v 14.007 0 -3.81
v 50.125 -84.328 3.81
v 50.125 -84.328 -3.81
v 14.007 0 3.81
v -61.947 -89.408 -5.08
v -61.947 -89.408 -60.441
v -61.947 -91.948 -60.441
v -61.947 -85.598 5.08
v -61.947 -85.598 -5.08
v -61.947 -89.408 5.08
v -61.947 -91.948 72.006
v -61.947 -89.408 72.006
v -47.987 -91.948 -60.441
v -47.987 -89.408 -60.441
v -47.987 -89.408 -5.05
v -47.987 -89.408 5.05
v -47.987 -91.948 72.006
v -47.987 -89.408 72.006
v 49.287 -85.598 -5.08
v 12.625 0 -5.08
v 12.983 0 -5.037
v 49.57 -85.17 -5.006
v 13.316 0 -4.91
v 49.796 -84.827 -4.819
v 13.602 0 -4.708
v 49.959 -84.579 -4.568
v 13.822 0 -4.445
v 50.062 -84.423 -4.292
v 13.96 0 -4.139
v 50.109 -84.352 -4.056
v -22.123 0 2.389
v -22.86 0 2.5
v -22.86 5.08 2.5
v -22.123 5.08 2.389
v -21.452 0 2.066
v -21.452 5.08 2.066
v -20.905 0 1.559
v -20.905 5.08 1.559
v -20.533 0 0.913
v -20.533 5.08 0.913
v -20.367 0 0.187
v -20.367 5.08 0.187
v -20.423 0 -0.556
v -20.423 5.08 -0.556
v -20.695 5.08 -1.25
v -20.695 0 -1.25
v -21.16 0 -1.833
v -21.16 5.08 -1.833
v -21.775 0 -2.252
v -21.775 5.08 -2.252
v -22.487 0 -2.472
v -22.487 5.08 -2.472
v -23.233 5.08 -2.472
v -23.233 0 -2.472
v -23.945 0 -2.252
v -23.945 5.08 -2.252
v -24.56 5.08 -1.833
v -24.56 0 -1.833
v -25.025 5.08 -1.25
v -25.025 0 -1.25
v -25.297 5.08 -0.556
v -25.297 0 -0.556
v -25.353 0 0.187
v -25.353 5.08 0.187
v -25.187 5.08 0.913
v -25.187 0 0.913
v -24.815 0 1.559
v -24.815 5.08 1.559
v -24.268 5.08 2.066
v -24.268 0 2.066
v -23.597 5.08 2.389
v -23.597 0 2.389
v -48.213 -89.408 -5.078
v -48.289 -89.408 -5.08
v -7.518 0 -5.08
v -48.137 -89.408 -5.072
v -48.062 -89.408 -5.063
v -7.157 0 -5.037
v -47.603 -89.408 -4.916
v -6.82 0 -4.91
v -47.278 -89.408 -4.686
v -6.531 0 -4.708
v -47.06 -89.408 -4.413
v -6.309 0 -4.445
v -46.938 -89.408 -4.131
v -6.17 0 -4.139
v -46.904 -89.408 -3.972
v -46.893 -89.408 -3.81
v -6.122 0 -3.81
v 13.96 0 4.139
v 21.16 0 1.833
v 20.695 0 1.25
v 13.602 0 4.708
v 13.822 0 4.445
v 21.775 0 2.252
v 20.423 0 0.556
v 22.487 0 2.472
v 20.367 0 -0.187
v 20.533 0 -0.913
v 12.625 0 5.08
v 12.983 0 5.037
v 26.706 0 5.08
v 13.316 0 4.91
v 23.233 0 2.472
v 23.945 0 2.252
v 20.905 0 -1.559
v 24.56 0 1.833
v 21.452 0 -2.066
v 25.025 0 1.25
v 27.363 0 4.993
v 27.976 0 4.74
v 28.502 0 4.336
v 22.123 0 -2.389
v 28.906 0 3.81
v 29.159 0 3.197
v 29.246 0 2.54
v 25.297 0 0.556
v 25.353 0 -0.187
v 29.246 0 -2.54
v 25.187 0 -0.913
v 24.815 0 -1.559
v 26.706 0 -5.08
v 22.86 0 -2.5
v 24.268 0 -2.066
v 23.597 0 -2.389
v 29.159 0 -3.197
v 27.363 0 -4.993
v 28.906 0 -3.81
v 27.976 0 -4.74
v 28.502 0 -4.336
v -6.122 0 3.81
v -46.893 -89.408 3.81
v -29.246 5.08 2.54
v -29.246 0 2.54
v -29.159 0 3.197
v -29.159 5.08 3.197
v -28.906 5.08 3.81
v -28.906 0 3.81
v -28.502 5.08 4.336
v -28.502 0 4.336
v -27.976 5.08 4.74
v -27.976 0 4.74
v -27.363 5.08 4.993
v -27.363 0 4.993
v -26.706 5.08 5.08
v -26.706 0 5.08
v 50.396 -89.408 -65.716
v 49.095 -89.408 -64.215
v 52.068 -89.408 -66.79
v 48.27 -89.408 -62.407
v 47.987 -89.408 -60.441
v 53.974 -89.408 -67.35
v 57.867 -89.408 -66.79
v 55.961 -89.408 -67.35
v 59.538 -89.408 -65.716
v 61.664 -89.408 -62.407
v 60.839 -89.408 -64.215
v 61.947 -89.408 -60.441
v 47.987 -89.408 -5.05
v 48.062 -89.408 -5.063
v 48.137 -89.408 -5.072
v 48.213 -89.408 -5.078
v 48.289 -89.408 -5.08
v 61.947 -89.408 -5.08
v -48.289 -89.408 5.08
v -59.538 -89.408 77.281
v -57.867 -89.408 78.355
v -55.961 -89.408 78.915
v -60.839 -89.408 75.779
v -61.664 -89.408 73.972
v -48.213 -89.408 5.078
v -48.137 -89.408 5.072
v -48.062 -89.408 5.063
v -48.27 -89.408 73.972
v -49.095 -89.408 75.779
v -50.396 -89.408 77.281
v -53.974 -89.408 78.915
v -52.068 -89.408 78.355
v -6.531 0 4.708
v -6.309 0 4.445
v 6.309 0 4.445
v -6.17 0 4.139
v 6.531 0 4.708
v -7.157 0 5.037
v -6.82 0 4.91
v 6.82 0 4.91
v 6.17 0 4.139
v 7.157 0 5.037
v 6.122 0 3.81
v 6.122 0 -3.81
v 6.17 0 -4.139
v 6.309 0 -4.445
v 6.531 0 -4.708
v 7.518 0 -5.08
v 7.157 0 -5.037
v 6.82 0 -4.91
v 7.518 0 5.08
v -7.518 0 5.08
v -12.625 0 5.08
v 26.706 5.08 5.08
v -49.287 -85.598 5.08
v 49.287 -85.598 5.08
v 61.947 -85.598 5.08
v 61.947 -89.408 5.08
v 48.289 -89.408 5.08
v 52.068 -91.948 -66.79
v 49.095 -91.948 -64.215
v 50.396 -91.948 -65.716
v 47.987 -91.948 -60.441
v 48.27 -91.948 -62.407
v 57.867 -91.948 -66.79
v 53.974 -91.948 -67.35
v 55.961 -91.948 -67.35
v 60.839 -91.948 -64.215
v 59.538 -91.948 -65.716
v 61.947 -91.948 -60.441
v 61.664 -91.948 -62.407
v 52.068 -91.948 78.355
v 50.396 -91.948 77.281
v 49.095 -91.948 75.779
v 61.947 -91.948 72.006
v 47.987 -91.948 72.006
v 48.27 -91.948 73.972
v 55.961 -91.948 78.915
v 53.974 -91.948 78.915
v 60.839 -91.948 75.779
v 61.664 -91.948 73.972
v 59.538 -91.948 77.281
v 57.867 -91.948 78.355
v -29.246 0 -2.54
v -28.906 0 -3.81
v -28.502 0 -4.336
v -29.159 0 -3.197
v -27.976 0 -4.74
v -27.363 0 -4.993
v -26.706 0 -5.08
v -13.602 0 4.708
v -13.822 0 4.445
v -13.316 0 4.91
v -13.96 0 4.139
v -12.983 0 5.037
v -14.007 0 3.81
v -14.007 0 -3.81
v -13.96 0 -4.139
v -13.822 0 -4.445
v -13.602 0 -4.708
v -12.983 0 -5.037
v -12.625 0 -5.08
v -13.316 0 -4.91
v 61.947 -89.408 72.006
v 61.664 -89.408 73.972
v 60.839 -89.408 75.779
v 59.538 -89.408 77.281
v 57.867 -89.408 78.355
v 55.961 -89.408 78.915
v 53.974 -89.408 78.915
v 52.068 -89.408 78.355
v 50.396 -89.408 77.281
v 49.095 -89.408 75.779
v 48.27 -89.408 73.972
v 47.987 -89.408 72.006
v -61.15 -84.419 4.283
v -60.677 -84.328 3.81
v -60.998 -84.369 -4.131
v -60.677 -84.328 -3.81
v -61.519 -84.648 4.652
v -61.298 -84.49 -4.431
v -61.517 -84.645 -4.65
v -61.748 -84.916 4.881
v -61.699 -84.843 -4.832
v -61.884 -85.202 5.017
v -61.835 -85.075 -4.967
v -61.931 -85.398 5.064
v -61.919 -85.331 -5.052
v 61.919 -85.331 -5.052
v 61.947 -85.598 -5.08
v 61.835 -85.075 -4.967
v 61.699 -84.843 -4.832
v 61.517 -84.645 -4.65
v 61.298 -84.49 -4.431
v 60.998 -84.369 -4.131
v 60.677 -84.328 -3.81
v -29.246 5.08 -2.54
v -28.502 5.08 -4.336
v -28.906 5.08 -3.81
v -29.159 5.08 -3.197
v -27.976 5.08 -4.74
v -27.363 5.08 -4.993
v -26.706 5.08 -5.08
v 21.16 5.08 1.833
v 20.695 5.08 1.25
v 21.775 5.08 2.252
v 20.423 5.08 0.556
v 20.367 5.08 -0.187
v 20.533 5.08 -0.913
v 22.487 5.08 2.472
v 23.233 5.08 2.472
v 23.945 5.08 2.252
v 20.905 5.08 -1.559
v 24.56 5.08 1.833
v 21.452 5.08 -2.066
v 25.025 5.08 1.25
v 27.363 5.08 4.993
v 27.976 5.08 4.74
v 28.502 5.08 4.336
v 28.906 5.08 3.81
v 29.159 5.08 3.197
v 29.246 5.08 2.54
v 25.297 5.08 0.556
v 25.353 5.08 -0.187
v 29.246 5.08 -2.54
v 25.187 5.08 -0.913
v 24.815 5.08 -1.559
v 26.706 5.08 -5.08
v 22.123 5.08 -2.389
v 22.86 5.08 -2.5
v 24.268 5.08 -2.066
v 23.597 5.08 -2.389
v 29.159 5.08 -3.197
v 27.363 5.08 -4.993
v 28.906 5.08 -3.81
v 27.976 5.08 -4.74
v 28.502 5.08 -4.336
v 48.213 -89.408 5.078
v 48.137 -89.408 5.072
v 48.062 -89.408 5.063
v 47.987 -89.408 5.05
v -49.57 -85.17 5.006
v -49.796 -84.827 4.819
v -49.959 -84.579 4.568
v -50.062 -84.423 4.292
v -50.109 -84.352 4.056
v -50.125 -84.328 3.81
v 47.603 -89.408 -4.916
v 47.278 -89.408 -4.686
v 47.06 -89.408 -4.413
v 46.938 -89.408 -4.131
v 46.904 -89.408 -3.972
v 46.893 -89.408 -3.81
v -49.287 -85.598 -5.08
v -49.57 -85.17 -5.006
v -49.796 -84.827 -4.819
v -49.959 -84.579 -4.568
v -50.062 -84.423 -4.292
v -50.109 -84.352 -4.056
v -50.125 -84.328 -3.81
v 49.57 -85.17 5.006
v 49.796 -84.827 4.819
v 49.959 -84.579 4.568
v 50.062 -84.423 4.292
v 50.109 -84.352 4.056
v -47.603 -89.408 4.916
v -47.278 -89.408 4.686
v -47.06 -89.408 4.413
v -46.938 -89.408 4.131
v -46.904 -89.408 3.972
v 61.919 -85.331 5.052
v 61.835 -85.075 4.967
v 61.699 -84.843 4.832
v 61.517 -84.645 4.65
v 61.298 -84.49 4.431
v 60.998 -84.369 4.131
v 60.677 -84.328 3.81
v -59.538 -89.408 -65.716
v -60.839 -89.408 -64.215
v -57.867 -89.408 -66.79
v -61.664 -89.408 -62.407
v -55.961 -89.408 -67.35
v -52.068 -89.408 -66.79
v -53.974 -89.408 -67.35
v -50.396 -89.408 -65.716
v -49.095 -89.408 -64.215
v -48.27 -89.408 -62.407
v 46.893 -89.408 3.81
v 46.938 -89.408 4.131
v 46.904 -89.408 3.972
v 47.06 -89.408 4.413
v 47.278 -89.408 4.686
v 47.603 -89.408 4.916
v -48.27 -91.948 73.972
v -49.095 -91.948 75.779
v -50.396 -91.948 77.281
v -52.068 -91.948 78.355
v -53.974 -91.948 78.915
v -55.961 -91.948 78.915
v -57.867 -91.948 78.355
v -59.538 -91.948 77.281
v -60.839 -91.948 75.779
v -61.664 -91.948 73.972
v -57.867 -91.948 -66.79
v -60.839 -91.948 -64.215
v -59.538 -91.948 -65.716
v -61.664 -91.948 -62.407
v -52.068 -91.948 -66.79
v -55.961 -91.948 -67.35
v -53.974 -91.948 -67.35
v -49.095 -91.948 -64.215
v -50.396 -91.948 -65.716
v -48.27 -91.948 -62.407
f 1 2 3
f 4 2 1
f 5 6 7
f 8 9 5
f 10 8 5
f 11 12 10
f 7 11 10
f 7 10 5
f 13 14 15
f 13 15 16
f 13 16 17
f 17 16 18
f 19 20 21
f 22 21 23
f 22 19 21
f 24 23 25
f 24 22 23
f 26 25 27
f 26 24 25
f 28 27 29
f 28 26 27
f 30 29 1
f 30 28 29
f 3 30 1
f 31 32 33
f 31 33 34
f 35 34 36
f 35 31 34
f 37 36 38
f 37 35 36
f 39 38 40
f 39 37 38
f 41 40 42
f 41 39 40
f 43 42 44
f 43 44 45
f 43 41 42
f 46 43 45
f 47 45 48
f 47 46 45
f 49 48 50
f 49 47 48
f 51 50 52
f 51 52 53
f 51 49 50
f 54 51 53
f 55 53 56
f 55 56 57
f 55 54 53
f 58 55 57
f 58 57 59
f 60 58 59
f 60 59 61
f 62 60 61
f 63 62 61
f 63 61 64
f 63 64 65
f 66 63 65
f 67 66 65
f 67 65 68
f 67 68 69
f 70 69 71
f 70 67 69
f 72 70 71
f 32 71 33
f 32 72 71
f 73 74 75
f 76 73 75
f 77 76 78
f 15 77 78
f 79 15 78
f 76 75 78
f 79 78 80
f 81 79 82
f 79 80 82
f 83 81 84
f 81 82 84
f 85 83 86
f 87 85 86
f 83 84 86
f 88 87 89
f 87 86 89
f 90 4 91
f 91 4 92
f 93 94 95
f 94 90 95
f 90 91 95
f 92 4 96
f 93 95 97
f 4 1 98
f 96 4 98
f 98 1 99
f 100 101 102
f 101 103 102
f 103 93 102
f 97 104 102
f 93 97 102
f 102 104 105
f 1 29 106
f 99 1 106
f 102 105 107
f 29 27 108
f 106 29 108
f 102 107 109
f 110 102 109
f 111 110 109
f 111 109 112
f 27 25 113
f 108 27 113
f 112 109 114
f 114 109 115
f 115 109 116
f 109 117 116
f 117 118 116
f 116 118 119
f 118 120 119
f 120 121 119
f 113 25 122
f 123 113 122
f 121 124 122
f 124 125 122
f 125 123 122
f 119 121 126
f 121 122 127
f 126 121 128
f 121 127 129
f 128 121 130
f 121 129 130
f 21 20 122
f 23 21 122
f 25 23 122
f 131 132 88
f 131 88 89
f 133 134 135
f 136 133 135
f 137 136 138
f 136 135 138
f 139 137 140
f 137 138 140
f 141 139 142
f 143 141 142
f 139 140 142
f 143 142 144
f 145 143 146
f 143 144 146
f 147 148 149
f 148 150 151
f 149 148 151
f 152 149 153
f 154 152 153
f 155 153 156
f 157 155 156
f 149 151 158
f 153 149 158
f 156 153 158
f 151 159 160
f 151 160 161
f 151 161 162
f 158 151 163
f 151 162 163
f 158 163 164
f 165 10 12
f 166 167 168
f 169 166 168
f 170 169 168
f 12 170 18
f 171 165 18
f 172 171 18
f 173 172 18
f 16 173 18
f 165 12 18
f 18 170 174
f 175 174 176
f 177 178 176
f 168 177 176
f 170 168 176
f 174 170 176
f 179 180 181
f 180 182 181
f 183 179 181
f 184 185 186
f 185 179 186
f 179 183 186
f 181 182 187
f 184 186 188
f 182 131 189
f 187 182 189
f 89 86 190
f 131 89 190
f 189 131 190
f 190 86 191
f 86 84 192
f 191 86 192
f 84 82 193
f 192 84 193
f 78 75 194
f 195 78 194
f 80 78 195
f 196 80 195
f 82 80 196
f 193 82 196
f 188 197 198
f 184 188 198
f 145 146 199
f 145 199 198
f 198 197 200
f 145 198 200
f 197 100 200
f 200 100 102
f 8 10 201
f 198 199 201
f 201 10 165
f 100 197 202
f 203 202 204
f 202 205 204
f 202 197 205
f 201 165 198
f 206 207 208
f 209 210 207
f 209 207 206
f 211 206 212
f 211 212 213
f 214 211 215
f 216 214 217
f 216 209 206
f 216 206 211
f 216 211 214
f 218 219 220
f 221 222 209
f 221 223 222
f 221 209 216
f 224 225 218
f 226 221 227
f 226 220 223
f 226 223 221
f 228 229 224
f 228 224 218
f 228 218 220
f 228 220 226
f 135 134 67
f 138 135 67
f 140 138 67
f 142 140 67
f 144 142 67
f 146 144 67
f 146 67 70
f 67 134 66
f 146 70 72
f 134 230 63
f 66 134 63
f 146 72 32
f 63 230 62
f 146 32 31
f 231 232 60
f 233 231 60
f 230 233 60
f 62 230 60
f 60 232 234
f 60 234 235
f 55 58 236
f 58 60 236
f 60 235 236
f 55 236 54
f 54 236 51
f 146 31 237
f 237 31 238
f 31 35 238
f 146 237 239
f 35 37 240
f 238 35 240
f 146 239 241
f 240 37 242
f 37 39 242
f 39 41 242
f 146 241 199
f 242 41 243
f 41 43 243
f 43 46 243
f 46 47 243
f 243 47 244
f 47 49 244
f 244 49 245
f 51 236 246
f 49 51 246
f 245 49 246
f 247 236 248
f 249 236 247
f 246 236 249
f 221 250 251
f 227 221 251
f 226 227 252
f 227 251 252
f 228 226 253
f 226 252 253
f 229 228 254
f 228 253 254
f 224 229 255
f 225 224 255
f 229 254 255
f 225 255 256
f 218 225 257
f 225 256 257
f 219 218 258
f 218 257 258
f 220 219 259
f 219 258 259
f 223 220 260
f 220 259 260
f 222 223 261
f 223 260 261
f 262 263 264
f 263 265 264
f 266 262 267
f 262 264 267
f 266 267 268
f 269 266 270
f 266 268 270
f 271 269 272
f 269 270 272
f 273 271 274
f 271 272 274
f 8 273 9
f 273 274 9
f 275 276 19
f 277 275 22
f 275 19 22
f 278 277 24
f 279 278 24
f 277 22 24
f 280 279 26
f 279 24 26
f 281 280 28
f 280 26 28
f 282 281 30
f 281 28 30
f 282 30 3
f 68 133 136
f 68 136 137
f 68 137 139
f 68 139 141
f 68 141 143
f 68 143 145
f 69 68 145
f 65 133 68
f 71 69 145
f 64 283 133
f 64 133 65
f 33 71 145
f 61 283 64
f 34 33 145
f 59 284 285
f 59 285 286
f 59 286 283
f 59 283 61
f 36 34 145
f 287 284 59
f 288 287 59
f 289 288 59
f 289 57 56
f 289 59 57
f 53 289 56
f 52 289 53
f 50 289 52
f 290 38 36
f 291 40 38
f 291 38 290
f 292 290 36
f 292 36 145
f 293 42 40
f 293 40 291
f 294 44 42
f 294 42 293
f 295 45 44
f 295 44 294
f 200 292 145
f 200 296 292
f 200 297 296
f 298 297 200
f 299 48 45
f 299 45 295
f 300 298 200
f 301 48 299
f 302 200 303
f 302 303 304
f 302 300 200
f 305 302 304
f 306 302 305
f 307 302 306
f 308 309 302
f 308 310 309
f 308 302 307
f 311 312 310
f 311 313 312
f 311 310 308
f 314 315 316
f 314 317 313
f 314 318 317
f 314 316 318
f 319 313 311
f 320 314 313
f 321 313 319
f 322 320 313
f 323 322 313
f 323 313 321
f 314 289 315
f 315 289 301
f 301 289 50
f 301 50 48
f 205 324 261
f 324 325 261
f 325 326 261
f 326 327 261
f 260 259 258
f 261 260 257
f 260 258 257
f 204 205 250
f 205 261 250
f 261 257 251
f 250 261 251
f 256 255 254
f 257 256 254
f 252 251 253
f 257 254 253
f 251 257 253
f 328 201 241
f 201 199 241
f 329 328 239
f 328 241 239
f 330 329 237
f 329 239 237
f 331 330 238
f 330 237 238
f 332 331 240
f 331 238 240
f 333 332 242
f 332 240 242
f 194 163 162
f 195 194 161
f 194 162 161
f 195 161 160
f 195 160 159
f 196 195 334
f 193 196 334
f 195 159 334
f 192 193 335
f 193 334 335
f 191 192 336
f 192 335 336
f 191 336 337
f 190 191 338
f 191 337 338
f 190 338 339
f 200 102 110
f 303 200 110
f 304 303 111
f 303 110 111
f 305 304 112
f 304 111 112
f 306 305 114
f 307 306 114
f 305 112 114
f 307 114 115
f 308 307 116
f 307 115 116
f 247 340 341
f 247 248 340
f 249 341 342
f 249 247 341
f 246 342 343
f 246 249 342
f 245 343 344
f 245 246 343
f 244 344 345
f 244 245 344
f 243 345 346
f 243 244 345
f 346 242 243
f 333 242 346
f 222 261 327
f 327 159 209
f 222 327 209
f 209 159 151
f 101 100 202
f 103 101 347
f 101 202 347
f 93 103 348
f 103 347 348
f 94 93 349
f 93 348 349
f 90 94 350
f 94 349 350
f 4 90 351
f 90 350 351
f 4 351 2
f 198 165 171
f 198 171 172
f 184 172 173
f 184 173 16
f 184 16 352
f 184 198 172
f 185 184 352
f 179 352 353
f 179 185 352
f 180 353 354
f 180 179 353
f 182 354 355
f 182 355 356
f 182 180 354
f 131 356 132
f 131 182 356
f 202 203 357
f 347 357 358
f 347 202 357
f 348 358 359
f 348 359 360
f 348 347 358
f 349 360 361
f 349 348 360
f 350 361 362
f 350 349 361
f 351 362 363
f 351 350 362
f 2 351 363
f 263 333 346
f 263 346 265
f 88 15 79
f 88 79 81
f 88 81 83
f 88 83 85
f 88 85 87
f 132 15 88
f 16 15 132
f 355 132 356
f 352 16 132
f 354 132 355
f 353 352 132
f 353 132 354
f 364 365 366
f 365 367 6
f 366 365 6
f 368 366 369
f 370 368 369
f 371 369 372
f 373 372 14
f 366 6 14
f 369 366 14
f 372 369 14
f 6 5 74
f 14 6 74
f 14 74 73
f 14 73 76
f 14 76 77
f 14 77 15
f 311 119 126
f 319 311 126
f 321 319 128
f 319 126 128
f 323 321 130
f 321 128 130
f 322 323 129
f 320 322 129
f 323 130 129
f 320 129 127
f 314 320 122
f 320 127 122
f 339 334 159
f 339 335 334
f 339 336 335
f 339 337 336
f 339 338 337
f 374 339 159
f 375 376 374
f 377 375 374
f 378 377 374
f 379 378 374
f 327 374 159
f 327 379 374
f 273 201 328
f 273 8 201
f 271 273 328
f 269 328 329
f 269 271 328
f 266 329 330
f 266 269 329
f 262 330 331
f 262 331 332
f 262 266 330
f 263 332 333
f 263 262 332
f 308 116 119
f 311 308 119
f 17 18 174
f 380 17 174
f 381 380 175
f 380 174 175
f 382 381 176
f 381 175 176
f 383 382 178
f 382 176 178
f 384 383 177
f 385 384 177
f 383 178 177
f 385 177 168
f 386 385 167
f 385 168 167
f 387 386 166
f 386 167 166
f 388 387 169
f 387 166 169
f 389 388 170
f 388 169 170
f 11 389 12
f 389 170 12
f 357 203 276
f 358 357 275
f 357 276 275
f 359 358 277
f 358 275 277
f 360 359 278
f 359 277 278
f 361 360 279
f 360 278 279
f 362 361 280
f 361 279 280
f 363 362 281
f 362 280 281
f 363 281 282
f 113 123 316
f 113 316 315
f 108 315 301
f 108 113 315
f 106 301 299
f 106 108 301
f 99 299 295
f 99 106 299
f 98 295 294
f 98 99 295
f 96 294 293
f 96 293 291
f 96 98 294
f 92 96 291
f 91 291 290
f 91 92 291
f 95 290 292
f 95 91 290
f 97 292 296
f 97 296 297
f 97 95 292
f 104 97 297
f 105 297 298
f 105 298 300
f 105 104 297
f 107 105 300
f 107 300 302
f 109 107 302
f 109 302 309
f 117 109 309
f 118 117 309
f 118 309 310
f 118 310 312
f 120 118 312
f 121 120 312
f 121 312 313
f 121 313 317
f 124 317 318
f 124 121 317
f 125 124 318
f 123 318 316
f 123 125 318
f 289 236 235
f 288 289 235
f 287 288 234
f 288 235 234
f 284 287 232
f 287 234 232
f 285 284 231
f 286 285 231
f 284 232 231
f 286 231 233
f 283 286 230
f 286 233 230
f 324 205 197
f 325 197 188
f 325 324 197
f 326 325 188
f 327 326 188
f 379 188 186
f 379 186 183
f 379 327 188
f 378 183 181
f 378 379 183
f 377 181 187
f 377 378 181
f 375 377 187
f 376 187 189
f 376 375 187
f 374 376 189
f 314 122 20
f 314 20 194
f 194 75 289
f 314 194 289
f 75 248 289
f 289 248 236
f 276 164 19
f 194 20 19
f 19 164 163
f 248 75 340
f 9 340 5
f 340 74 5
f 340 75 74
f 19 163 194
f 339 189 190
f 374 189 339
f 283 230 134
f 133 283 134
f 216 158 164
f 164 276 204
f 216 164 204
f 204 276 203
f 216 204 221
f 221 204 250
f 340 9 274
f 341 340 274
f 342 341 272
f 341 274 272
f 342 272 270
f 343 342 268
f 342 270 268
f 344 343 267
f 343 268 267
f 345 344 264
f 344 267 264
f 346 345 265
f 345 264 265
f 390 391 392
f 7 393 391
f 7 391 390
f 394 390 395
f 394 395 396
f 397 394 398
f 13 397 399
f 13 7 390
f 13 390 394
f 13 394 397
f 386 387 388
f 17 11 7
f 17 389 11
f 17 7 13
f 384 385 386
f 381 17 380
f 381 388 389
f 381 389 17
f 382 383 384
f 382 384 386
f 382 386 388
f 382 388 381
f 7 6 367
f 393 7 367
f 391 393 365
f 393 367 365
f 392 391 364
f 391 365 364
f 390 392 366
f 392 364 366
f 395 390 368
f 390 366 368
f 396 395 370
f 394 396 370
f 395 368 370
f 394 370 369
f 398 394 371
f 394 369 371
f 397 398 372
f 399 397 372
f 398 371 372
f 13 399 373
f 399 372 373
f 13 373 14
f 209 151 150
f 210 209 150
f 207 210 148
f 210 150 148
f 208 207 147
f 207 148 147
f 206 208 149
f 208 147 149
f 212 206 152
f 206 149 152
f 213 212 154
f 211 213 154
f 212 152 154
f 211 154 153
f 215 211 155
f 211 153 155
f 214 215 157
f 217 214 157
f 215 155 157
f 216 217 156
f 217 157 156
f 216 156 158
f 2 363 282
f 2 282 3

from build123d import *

# Parameters (mm, degrees)
SKETCH1_R           = 2.5
BOSS_EXTRUDE1_DEPTH = 5.08
BOSS_EXTRUDE2_DEPTH = 10.16
FILLET2_R           = 1.27
FILLET3_R           = 1.27
BOSS_EXTRUDE3_DEPTH = 2.54


with BuildPart() as part:
    # Sketch1 → Boss-Extrude1 (new body)
    with BuildSketch(Plane(origin=(0, 0, 0), x_dir=(1, 0, 0), z_dir=(0, 1, 0))):
        with BuildLine():
            Line((26.705849829, 5.08), (-26.705849829, 5.08))
            ThreePointArc((-26.705849829, 5.08), (-28.501901053, 4.336051224), (-29.245849829, 2.54))
            Line((-29.245849829, 2.54), (-29.245849829, -2.54))
            ThreePointArc((-29.245849829, -2.54), (-28.501901053, -4.336051224), (-26.705849829, -5.08))
            Line((-26.705849829, -5.08), (26.705849829, -5.08))
            ThreePointArc((26.705849829, -5.08), (28.501901053, -4.336051224), (29.245849829, -2.54))
            Line((29.245849829, -2.54), (29.245849829, 2.54))
            ThreePointArc((29.245849829, 2.54), (28.501901053, 4.336051224), (26.705849829, 5.08))
        make_face()
        with Locations(Location((-22.86, 0, 0), (0, 0, 270))):
            Circle(SKETCH1_R, mode=Mode.SUBTRACT)
        with Locations(Location((22.86, 0, 0), (0, 0, 90))):
            Circle(SKETCH1_R, mode=Mode.SUBTRACT)
    extrude(amount=BOSS_EXTRUDE1_DEPTH)

    # Sketch2 → Boss-Extrude2 (add)
    with BuildSketch(Plane.XY.offset(5.08)):
        Polygon((-14.007084232, 0), (-50.125026448, -84.328), (-61.947051412, -84.328), (-61.947051412, -89.408), (-50.8, -89.408), (-46.892843325, -89.408), (-6.12233164, 0), align=None)
        Polygon((50.8, -89.408), (61.947051412, -89.408), (61.947051412, -84.328), (50.125026448, -84.328), (14.007084232, 0), (6.12233164, 0), (46.892843325, -89.408), align=None)
    extrude(amount=-BOSS_EXTRUDE2_DEPTH)

    # Fillet2
    fillet2_edges = [part.edges().sort_by_distance(p)[0] for p in [
        (-56.03603893, -84.328, -5.08),
        (-61.947051412, -84.328, 0),
        (-56.03603893, -84.328, 5.08),
        (56.03603893, -84.328, -5.08),
        (61.947051412, -84.328, 0),
        (56.03603893, -84.328, 5.08),
    ]]
    fillet(fillet2_edges, radius=FILLET2_R)

    # Fillet3
    fillet3_edges = [part.edges().sort_by_distance(p)[0] for p in [
        (32.338027797, -42.799, 5.08),
        (26.507587483, -44.704, 5.08),
        (26.507587483, -44.704, -5.08),
        (32.338027797, -42.799, -5.08),
        (-26.507587483, -44.704, 5.08),
        (-26.507587483, -44.704, -5.08),
        (-32.338027797, -42.799, -5.08),
        (-32.338027797, -42.799, 5.08),
    ]]
    fillet(fillet3_edges, radius=FILLET3_R)

    # Sketch3 → Boss-Extrude3 (add)
    with BuildSketch(Plane.XZ.offset(89.408)):
        with BuildLine():
            Line((47.98747777, 72.005934115), (47.98747777, -60.440977769))
            ThreePointArc((47.98747777, -60.440977769), (54.967264591, -67.420764589), (61.947051412, -60.440977769))
            Line((61.947051412, -60.440977769), (61.947051412, 72.005934115))
            ThreePointArc((61.947051412, 72.005934115), (54.967264591, 78.985720936), (47.98747777, 72.005934115))
        make_face()
        with BuildLine():
            Line((-61.947051412, 72.005934115), (-61.947051412, -60.440977769))
            ThreePointArc((-61.947051412, -60.440977769), (-54.967264591, -67.420764589), (-47.98747777, -60.440977769))
            Line((-47.98747777, -60.440977769), (-47.98747777, 72.005934115))
            ThreePointArc((-47.98747777, 72.005934115), (-54.967264591, 78.985720936), (-61.947051412, 72.005934115))
        make_face()
    extrude(amount=BOSS_EXTRUDE3_DEPTH)


solid = part.part
